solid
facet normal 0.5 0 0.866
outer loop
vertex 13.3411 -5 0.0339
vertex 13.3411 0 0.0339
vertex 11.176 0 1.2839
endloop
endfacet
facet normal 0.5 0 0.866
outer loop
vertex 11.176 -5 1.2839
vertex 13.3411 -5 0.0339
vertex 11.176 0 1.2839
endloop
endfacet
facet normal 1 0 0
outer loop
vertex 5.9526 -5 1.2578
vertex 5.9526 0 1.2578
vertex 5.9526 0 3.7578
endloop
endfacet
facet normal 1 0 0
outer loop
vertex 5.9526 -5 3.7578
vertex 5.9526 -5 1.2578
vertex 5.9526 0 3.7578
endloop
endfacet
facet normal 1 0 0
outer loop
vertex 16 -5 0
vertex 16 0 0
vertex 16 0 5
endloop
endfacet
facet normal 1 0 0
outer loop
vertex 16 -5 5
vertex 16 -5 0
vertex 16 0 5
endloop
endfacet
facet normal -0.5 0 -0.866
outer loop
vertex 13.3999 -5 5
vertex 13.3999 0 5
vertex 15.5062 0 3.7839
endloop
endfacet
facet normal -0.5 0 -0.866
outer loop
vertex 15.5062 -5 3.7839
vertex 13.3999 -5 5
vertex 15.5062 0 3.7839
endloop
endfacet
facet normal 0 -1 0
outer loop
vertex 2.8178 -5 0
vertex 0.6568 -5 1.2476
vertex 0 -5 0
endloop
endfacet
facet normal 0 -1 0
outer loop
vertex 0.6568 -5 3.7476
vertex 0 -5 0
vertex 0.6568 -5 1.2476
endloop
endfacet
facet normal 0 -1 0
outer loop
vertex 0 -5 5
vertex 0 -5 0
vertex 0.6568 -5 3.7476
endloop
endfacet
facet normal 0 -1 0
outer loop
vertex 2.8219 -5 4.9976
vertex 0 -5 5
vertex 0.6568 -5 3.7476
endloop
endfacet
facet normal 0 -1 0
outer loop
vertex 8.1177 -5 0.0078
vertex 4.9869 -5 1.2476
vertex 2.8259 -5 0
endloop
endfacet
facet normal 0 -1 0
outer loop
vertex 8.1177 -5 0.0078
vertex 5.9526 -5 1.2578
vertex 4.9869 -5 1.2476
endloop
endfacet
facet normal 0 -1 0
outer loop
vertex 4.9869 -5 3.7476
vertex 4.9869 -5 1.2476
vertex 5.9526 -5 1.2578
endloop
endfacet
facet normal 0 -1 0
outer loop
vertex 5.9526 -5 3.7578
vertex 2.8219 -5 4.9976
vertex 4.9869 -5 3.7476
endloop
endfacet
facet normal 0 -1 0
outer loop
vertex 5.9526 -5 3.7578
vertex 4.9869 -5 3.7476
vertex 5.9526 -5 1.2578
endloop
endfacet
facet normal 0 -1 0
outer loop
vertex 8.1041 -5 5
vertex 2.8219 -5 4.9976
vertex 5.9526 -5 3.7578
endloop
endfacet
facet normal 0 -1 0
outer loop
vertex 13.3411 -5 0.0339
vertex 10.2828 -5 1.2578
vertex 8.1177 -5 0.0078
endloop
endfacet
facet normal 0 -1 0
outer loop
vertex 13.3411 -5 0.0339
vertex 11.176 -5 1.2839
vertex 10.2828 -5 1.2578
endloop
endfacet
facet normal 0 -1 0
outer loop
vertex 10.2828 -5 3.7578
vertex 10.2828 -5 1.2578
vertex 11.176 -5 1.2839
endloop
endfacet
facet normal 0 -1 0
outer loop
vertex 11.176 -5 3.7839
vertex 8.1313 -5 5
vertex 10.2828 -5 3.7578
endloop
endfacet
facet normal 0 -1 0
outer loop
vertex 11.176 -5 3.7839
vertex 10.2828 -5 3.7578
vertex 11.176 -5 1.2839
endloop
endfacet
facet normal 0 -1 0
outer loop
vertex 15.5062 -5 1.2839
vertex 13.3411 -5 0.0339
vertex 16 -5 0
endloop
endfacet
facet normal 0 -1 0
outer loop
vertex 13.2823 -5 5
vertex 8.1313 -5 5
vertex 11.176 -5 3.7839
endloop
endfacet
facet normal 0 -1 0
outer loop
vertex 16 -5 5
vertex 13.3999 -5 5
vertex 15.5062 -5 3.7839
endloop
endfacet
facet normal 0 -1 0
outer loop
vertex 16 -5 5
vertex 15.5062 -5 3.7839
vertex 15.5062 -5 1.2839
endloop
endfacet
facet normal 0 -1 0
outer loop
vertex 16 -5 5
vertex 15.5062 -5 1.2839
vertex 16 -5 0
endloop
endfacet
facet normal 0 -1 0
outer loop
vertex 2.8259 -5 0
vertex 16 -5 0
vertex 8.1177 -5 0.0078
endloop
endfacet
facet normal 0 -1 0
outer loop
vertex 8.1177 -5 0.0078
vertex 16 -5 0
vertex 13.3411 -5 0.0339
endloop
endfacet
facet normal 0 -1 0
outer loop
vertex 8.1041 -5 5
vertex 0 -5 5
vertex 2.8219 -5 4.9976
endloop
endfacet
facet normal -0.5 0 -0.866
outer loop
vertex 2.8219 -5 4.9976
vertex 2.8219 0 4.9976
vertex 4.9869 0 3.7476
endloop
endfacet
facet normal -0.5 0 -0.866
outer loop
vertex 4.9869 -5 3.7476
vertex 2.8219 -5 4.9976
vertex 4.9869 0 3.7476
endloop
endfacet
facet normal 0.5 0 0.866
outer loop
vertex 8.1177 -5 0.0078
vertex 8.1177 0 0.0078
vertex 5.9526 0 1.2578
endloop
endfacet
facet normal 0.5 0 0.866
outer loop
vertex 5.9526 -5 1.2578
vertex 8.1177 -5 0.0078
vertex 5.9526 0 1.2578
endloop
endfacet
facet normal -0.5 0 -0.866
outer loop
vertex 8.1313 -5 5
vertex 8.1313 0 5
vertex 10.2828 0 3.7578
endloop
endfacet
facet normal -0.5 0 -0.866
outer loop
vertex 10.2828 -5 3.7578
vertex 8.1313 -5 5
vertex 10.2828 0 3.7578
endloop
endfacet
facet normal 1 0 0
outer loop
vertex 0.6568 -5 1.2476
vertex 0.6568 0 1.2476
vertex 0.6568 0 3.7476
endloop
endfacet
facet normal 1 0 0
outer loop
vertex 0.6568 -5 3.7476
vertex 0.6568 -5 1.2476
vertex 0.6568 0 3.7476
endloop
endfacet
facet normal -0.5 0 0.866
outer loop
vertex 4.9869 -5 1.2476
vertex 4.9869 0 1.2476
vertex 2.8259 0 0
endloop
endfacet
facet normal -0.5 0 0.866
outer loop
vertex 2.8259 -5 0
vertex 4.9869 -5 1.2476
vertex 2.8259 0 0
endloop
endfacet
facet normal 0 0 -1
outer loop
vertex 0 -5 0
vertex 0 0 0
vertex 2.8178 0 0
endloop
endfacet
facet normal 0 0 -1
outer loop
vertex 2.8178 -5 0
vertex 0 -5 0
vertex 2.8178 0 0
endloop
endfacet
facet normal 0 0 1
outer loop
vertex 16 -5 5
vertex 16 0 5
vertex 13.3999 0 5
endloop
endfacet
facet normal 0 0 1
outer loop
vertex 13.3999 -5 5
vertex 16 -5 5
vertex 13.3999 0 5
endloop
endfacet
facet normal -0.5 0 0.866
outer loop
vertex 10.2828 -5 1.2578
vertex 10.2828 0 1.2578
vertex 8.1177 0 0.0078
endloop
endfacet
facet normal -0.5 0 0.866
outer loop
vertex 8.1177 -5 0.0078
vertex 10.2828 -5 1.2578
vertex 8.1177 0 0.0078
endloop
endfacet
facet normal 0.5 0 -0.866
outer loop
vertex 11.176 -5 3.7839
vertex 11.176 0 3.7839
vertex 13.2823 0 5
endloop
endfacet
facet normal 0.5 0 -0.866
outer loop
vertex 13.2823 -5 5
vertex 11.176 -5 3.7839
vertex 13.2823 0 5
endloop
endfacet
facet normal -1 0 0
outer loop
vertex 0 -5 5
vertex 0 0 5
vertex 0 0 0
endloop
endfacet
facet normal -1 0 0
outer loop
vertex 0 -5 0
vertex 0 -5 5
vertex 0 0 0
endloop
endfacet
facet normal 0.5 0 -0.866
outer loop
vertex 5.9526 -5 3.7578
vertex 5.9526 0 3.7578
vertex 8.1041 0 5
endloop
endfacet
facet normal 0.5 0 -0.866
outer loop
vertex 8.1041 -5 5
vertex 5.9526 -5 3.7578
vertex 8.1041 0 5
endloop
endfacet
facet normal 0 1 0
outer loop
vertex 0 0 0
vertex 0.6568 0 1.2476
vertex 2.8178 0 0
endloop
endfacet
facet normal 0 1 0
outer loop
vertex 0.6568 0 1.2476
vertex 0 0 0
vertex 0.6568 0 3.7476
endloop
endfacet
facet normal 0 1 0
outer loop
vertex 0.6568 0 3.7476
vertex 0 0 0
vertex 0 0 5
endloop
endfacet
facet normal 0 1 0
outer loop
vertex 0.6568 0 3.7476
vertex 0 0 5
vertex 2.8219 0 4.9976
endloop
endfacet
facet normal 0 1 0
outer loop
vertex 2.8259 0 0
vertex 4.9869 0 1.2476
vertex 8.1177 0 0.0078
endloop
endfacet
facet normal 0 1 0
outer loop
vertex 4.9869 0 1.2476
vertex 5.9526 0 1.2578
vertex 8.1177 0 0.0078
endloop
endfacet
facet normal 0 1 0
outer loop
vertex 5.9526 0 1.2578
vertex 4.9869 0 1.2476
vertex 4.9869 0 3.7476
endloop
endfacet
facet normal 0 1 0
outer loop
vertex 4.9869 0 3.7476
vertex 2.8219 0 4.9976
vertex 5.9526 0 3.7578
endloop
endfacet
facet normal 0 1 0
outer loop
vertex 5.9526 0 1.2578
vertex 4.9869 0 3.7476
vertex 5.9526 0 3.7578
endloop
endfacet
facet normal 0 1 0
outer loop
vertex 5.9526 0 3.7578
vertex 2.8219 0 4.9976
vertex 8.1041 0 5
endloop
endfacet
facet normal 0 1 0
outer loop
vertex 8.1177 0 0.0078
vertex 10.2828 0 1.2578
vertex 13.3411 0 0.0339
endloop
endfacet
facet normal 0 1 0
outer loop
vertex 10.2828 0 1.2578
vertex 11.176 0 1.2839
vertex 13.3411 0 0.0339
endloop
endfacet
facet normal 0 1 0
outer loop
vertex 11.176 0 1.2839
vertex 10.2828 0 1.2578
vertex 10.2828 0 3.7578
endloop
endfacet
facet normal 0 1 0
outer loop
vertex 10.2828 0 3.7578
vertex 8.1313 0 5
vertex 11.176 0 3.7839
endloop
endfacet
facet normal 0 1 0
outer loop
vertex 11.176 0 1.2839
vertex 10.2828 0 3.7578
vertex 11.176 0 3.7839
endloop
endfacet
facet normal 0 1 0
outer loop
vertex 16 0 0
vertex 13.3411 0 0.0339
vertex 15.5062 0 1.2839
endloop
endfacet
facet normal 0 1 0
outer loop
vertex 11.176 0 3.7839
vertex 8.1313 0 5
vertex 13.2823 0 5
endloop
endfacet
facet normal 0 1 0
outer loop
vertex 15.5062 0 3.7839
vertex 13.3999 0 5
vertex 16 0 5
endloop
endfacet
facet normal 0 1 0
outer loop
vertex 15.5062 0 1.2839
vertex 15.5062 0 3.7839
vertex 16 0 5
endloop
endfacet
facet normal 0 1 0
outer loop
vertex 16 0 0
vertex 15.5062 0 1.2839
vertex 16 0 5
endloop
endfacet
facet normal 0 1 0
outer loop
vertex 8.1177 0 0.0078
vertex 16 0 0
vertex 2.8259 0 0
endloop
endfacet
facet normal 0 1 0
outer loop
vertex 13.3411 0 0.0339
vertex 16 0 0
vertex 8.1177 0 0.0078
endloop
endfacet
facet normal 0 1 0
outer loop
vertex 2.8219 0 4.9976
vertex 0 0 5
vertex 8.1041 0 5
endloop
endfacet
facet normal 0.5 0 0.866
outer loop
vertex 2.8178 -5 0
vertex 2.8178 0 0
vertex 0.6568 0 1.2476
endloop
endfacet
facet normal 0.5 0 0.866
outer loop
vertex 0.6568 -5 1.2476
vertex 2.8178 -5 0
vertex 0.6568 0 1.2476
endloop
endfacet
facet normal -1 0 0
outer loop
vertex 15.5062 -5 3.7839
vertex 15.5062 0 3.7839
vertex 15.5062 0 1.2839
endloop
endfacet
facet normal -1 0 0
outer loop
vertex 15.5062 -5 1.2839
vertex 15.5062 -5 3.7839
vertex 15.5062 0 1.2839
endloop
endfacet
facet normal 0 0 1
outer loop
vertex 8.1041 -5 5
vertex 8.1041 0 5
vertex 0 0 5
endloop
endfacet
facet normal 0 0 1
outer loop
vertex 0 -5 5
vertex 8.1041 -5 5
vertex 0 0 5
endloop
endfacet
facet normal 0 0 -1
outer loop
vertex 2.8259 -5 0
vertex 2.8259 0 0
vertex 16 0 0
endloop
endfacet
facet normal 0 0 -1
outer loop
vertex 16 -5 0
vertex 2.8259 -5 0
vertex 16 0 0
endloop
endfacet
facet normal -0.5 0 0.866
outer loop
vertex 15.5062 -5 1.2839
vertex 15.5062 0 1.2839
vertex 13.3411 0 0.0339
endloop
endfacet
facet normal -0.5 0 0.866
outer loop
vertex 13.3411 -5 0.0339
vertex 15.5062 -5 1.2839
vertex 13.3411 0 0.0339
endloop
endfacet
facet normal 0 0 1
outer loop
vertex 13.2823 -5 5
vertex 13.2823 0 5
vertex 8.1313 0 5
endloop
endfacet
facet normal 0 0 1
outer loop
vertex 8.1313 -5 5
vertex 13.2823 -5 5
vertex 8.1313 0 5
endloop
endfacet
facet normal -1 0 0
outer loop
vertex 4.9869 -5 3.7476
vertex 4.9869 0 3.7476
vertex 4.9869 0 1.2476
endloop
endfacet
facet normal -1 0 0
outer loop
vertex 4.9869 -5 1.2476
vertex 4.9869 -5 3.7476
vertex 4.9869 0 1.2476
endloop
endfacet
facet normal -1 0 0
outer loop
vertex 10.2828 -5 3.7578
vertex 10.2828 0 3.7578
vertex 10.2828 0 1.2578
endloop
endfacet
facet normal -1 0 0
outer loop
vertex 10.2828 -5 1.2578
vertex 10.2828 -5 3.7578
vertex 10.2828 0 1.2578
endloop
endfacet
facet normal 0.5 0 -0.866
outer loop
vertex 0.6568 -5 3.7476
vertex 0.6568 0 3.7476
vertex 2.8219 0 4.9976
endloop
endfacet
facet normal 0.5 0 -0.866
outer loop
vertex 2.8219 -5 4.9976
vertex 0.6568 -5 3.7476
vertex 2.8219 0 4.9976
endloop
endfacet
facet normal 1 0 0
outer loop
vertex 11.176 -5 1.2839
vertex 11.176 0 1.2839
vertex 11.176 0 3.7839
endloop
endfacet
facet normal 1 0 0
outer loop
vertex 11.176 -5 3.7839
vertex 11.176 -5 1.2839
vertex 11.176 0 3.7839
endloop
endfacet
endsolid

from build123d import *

# Parameters (mm, degrees)
F1_DEPTH = 5


with BuildPart() as f1:
    # F0 (on Front) → F1 (new body)
    with BuildSketch(Plane.XZ):
        Polygon((0, 5), (0, 0), (2.817796, 0), (0.656805, 1.247649), (0.656805, 3.747649), (2.821869, 4.997649), (4.986932, 3.747649), (4.986932, 1.247649), (2.825941, 0), (16, 0), (16, 5), (13.399874, 5), (15.50617, 3.78393), (15.50617, 1.28393), (13.341106, 0.03393), (11.176043, 1.28393), (11.176043, 3.78393), (13.282339, 5), (8.131277, 5), (10.282767, 3.757837), (10.282767, 1.257837), (8.117704, 0.007837), (5.95264, 1.257837), (5.95264, 3.757837), (8.10413, 5), align=None)
    extrude(amount=F1_DEPTH)


solid = f1.part
